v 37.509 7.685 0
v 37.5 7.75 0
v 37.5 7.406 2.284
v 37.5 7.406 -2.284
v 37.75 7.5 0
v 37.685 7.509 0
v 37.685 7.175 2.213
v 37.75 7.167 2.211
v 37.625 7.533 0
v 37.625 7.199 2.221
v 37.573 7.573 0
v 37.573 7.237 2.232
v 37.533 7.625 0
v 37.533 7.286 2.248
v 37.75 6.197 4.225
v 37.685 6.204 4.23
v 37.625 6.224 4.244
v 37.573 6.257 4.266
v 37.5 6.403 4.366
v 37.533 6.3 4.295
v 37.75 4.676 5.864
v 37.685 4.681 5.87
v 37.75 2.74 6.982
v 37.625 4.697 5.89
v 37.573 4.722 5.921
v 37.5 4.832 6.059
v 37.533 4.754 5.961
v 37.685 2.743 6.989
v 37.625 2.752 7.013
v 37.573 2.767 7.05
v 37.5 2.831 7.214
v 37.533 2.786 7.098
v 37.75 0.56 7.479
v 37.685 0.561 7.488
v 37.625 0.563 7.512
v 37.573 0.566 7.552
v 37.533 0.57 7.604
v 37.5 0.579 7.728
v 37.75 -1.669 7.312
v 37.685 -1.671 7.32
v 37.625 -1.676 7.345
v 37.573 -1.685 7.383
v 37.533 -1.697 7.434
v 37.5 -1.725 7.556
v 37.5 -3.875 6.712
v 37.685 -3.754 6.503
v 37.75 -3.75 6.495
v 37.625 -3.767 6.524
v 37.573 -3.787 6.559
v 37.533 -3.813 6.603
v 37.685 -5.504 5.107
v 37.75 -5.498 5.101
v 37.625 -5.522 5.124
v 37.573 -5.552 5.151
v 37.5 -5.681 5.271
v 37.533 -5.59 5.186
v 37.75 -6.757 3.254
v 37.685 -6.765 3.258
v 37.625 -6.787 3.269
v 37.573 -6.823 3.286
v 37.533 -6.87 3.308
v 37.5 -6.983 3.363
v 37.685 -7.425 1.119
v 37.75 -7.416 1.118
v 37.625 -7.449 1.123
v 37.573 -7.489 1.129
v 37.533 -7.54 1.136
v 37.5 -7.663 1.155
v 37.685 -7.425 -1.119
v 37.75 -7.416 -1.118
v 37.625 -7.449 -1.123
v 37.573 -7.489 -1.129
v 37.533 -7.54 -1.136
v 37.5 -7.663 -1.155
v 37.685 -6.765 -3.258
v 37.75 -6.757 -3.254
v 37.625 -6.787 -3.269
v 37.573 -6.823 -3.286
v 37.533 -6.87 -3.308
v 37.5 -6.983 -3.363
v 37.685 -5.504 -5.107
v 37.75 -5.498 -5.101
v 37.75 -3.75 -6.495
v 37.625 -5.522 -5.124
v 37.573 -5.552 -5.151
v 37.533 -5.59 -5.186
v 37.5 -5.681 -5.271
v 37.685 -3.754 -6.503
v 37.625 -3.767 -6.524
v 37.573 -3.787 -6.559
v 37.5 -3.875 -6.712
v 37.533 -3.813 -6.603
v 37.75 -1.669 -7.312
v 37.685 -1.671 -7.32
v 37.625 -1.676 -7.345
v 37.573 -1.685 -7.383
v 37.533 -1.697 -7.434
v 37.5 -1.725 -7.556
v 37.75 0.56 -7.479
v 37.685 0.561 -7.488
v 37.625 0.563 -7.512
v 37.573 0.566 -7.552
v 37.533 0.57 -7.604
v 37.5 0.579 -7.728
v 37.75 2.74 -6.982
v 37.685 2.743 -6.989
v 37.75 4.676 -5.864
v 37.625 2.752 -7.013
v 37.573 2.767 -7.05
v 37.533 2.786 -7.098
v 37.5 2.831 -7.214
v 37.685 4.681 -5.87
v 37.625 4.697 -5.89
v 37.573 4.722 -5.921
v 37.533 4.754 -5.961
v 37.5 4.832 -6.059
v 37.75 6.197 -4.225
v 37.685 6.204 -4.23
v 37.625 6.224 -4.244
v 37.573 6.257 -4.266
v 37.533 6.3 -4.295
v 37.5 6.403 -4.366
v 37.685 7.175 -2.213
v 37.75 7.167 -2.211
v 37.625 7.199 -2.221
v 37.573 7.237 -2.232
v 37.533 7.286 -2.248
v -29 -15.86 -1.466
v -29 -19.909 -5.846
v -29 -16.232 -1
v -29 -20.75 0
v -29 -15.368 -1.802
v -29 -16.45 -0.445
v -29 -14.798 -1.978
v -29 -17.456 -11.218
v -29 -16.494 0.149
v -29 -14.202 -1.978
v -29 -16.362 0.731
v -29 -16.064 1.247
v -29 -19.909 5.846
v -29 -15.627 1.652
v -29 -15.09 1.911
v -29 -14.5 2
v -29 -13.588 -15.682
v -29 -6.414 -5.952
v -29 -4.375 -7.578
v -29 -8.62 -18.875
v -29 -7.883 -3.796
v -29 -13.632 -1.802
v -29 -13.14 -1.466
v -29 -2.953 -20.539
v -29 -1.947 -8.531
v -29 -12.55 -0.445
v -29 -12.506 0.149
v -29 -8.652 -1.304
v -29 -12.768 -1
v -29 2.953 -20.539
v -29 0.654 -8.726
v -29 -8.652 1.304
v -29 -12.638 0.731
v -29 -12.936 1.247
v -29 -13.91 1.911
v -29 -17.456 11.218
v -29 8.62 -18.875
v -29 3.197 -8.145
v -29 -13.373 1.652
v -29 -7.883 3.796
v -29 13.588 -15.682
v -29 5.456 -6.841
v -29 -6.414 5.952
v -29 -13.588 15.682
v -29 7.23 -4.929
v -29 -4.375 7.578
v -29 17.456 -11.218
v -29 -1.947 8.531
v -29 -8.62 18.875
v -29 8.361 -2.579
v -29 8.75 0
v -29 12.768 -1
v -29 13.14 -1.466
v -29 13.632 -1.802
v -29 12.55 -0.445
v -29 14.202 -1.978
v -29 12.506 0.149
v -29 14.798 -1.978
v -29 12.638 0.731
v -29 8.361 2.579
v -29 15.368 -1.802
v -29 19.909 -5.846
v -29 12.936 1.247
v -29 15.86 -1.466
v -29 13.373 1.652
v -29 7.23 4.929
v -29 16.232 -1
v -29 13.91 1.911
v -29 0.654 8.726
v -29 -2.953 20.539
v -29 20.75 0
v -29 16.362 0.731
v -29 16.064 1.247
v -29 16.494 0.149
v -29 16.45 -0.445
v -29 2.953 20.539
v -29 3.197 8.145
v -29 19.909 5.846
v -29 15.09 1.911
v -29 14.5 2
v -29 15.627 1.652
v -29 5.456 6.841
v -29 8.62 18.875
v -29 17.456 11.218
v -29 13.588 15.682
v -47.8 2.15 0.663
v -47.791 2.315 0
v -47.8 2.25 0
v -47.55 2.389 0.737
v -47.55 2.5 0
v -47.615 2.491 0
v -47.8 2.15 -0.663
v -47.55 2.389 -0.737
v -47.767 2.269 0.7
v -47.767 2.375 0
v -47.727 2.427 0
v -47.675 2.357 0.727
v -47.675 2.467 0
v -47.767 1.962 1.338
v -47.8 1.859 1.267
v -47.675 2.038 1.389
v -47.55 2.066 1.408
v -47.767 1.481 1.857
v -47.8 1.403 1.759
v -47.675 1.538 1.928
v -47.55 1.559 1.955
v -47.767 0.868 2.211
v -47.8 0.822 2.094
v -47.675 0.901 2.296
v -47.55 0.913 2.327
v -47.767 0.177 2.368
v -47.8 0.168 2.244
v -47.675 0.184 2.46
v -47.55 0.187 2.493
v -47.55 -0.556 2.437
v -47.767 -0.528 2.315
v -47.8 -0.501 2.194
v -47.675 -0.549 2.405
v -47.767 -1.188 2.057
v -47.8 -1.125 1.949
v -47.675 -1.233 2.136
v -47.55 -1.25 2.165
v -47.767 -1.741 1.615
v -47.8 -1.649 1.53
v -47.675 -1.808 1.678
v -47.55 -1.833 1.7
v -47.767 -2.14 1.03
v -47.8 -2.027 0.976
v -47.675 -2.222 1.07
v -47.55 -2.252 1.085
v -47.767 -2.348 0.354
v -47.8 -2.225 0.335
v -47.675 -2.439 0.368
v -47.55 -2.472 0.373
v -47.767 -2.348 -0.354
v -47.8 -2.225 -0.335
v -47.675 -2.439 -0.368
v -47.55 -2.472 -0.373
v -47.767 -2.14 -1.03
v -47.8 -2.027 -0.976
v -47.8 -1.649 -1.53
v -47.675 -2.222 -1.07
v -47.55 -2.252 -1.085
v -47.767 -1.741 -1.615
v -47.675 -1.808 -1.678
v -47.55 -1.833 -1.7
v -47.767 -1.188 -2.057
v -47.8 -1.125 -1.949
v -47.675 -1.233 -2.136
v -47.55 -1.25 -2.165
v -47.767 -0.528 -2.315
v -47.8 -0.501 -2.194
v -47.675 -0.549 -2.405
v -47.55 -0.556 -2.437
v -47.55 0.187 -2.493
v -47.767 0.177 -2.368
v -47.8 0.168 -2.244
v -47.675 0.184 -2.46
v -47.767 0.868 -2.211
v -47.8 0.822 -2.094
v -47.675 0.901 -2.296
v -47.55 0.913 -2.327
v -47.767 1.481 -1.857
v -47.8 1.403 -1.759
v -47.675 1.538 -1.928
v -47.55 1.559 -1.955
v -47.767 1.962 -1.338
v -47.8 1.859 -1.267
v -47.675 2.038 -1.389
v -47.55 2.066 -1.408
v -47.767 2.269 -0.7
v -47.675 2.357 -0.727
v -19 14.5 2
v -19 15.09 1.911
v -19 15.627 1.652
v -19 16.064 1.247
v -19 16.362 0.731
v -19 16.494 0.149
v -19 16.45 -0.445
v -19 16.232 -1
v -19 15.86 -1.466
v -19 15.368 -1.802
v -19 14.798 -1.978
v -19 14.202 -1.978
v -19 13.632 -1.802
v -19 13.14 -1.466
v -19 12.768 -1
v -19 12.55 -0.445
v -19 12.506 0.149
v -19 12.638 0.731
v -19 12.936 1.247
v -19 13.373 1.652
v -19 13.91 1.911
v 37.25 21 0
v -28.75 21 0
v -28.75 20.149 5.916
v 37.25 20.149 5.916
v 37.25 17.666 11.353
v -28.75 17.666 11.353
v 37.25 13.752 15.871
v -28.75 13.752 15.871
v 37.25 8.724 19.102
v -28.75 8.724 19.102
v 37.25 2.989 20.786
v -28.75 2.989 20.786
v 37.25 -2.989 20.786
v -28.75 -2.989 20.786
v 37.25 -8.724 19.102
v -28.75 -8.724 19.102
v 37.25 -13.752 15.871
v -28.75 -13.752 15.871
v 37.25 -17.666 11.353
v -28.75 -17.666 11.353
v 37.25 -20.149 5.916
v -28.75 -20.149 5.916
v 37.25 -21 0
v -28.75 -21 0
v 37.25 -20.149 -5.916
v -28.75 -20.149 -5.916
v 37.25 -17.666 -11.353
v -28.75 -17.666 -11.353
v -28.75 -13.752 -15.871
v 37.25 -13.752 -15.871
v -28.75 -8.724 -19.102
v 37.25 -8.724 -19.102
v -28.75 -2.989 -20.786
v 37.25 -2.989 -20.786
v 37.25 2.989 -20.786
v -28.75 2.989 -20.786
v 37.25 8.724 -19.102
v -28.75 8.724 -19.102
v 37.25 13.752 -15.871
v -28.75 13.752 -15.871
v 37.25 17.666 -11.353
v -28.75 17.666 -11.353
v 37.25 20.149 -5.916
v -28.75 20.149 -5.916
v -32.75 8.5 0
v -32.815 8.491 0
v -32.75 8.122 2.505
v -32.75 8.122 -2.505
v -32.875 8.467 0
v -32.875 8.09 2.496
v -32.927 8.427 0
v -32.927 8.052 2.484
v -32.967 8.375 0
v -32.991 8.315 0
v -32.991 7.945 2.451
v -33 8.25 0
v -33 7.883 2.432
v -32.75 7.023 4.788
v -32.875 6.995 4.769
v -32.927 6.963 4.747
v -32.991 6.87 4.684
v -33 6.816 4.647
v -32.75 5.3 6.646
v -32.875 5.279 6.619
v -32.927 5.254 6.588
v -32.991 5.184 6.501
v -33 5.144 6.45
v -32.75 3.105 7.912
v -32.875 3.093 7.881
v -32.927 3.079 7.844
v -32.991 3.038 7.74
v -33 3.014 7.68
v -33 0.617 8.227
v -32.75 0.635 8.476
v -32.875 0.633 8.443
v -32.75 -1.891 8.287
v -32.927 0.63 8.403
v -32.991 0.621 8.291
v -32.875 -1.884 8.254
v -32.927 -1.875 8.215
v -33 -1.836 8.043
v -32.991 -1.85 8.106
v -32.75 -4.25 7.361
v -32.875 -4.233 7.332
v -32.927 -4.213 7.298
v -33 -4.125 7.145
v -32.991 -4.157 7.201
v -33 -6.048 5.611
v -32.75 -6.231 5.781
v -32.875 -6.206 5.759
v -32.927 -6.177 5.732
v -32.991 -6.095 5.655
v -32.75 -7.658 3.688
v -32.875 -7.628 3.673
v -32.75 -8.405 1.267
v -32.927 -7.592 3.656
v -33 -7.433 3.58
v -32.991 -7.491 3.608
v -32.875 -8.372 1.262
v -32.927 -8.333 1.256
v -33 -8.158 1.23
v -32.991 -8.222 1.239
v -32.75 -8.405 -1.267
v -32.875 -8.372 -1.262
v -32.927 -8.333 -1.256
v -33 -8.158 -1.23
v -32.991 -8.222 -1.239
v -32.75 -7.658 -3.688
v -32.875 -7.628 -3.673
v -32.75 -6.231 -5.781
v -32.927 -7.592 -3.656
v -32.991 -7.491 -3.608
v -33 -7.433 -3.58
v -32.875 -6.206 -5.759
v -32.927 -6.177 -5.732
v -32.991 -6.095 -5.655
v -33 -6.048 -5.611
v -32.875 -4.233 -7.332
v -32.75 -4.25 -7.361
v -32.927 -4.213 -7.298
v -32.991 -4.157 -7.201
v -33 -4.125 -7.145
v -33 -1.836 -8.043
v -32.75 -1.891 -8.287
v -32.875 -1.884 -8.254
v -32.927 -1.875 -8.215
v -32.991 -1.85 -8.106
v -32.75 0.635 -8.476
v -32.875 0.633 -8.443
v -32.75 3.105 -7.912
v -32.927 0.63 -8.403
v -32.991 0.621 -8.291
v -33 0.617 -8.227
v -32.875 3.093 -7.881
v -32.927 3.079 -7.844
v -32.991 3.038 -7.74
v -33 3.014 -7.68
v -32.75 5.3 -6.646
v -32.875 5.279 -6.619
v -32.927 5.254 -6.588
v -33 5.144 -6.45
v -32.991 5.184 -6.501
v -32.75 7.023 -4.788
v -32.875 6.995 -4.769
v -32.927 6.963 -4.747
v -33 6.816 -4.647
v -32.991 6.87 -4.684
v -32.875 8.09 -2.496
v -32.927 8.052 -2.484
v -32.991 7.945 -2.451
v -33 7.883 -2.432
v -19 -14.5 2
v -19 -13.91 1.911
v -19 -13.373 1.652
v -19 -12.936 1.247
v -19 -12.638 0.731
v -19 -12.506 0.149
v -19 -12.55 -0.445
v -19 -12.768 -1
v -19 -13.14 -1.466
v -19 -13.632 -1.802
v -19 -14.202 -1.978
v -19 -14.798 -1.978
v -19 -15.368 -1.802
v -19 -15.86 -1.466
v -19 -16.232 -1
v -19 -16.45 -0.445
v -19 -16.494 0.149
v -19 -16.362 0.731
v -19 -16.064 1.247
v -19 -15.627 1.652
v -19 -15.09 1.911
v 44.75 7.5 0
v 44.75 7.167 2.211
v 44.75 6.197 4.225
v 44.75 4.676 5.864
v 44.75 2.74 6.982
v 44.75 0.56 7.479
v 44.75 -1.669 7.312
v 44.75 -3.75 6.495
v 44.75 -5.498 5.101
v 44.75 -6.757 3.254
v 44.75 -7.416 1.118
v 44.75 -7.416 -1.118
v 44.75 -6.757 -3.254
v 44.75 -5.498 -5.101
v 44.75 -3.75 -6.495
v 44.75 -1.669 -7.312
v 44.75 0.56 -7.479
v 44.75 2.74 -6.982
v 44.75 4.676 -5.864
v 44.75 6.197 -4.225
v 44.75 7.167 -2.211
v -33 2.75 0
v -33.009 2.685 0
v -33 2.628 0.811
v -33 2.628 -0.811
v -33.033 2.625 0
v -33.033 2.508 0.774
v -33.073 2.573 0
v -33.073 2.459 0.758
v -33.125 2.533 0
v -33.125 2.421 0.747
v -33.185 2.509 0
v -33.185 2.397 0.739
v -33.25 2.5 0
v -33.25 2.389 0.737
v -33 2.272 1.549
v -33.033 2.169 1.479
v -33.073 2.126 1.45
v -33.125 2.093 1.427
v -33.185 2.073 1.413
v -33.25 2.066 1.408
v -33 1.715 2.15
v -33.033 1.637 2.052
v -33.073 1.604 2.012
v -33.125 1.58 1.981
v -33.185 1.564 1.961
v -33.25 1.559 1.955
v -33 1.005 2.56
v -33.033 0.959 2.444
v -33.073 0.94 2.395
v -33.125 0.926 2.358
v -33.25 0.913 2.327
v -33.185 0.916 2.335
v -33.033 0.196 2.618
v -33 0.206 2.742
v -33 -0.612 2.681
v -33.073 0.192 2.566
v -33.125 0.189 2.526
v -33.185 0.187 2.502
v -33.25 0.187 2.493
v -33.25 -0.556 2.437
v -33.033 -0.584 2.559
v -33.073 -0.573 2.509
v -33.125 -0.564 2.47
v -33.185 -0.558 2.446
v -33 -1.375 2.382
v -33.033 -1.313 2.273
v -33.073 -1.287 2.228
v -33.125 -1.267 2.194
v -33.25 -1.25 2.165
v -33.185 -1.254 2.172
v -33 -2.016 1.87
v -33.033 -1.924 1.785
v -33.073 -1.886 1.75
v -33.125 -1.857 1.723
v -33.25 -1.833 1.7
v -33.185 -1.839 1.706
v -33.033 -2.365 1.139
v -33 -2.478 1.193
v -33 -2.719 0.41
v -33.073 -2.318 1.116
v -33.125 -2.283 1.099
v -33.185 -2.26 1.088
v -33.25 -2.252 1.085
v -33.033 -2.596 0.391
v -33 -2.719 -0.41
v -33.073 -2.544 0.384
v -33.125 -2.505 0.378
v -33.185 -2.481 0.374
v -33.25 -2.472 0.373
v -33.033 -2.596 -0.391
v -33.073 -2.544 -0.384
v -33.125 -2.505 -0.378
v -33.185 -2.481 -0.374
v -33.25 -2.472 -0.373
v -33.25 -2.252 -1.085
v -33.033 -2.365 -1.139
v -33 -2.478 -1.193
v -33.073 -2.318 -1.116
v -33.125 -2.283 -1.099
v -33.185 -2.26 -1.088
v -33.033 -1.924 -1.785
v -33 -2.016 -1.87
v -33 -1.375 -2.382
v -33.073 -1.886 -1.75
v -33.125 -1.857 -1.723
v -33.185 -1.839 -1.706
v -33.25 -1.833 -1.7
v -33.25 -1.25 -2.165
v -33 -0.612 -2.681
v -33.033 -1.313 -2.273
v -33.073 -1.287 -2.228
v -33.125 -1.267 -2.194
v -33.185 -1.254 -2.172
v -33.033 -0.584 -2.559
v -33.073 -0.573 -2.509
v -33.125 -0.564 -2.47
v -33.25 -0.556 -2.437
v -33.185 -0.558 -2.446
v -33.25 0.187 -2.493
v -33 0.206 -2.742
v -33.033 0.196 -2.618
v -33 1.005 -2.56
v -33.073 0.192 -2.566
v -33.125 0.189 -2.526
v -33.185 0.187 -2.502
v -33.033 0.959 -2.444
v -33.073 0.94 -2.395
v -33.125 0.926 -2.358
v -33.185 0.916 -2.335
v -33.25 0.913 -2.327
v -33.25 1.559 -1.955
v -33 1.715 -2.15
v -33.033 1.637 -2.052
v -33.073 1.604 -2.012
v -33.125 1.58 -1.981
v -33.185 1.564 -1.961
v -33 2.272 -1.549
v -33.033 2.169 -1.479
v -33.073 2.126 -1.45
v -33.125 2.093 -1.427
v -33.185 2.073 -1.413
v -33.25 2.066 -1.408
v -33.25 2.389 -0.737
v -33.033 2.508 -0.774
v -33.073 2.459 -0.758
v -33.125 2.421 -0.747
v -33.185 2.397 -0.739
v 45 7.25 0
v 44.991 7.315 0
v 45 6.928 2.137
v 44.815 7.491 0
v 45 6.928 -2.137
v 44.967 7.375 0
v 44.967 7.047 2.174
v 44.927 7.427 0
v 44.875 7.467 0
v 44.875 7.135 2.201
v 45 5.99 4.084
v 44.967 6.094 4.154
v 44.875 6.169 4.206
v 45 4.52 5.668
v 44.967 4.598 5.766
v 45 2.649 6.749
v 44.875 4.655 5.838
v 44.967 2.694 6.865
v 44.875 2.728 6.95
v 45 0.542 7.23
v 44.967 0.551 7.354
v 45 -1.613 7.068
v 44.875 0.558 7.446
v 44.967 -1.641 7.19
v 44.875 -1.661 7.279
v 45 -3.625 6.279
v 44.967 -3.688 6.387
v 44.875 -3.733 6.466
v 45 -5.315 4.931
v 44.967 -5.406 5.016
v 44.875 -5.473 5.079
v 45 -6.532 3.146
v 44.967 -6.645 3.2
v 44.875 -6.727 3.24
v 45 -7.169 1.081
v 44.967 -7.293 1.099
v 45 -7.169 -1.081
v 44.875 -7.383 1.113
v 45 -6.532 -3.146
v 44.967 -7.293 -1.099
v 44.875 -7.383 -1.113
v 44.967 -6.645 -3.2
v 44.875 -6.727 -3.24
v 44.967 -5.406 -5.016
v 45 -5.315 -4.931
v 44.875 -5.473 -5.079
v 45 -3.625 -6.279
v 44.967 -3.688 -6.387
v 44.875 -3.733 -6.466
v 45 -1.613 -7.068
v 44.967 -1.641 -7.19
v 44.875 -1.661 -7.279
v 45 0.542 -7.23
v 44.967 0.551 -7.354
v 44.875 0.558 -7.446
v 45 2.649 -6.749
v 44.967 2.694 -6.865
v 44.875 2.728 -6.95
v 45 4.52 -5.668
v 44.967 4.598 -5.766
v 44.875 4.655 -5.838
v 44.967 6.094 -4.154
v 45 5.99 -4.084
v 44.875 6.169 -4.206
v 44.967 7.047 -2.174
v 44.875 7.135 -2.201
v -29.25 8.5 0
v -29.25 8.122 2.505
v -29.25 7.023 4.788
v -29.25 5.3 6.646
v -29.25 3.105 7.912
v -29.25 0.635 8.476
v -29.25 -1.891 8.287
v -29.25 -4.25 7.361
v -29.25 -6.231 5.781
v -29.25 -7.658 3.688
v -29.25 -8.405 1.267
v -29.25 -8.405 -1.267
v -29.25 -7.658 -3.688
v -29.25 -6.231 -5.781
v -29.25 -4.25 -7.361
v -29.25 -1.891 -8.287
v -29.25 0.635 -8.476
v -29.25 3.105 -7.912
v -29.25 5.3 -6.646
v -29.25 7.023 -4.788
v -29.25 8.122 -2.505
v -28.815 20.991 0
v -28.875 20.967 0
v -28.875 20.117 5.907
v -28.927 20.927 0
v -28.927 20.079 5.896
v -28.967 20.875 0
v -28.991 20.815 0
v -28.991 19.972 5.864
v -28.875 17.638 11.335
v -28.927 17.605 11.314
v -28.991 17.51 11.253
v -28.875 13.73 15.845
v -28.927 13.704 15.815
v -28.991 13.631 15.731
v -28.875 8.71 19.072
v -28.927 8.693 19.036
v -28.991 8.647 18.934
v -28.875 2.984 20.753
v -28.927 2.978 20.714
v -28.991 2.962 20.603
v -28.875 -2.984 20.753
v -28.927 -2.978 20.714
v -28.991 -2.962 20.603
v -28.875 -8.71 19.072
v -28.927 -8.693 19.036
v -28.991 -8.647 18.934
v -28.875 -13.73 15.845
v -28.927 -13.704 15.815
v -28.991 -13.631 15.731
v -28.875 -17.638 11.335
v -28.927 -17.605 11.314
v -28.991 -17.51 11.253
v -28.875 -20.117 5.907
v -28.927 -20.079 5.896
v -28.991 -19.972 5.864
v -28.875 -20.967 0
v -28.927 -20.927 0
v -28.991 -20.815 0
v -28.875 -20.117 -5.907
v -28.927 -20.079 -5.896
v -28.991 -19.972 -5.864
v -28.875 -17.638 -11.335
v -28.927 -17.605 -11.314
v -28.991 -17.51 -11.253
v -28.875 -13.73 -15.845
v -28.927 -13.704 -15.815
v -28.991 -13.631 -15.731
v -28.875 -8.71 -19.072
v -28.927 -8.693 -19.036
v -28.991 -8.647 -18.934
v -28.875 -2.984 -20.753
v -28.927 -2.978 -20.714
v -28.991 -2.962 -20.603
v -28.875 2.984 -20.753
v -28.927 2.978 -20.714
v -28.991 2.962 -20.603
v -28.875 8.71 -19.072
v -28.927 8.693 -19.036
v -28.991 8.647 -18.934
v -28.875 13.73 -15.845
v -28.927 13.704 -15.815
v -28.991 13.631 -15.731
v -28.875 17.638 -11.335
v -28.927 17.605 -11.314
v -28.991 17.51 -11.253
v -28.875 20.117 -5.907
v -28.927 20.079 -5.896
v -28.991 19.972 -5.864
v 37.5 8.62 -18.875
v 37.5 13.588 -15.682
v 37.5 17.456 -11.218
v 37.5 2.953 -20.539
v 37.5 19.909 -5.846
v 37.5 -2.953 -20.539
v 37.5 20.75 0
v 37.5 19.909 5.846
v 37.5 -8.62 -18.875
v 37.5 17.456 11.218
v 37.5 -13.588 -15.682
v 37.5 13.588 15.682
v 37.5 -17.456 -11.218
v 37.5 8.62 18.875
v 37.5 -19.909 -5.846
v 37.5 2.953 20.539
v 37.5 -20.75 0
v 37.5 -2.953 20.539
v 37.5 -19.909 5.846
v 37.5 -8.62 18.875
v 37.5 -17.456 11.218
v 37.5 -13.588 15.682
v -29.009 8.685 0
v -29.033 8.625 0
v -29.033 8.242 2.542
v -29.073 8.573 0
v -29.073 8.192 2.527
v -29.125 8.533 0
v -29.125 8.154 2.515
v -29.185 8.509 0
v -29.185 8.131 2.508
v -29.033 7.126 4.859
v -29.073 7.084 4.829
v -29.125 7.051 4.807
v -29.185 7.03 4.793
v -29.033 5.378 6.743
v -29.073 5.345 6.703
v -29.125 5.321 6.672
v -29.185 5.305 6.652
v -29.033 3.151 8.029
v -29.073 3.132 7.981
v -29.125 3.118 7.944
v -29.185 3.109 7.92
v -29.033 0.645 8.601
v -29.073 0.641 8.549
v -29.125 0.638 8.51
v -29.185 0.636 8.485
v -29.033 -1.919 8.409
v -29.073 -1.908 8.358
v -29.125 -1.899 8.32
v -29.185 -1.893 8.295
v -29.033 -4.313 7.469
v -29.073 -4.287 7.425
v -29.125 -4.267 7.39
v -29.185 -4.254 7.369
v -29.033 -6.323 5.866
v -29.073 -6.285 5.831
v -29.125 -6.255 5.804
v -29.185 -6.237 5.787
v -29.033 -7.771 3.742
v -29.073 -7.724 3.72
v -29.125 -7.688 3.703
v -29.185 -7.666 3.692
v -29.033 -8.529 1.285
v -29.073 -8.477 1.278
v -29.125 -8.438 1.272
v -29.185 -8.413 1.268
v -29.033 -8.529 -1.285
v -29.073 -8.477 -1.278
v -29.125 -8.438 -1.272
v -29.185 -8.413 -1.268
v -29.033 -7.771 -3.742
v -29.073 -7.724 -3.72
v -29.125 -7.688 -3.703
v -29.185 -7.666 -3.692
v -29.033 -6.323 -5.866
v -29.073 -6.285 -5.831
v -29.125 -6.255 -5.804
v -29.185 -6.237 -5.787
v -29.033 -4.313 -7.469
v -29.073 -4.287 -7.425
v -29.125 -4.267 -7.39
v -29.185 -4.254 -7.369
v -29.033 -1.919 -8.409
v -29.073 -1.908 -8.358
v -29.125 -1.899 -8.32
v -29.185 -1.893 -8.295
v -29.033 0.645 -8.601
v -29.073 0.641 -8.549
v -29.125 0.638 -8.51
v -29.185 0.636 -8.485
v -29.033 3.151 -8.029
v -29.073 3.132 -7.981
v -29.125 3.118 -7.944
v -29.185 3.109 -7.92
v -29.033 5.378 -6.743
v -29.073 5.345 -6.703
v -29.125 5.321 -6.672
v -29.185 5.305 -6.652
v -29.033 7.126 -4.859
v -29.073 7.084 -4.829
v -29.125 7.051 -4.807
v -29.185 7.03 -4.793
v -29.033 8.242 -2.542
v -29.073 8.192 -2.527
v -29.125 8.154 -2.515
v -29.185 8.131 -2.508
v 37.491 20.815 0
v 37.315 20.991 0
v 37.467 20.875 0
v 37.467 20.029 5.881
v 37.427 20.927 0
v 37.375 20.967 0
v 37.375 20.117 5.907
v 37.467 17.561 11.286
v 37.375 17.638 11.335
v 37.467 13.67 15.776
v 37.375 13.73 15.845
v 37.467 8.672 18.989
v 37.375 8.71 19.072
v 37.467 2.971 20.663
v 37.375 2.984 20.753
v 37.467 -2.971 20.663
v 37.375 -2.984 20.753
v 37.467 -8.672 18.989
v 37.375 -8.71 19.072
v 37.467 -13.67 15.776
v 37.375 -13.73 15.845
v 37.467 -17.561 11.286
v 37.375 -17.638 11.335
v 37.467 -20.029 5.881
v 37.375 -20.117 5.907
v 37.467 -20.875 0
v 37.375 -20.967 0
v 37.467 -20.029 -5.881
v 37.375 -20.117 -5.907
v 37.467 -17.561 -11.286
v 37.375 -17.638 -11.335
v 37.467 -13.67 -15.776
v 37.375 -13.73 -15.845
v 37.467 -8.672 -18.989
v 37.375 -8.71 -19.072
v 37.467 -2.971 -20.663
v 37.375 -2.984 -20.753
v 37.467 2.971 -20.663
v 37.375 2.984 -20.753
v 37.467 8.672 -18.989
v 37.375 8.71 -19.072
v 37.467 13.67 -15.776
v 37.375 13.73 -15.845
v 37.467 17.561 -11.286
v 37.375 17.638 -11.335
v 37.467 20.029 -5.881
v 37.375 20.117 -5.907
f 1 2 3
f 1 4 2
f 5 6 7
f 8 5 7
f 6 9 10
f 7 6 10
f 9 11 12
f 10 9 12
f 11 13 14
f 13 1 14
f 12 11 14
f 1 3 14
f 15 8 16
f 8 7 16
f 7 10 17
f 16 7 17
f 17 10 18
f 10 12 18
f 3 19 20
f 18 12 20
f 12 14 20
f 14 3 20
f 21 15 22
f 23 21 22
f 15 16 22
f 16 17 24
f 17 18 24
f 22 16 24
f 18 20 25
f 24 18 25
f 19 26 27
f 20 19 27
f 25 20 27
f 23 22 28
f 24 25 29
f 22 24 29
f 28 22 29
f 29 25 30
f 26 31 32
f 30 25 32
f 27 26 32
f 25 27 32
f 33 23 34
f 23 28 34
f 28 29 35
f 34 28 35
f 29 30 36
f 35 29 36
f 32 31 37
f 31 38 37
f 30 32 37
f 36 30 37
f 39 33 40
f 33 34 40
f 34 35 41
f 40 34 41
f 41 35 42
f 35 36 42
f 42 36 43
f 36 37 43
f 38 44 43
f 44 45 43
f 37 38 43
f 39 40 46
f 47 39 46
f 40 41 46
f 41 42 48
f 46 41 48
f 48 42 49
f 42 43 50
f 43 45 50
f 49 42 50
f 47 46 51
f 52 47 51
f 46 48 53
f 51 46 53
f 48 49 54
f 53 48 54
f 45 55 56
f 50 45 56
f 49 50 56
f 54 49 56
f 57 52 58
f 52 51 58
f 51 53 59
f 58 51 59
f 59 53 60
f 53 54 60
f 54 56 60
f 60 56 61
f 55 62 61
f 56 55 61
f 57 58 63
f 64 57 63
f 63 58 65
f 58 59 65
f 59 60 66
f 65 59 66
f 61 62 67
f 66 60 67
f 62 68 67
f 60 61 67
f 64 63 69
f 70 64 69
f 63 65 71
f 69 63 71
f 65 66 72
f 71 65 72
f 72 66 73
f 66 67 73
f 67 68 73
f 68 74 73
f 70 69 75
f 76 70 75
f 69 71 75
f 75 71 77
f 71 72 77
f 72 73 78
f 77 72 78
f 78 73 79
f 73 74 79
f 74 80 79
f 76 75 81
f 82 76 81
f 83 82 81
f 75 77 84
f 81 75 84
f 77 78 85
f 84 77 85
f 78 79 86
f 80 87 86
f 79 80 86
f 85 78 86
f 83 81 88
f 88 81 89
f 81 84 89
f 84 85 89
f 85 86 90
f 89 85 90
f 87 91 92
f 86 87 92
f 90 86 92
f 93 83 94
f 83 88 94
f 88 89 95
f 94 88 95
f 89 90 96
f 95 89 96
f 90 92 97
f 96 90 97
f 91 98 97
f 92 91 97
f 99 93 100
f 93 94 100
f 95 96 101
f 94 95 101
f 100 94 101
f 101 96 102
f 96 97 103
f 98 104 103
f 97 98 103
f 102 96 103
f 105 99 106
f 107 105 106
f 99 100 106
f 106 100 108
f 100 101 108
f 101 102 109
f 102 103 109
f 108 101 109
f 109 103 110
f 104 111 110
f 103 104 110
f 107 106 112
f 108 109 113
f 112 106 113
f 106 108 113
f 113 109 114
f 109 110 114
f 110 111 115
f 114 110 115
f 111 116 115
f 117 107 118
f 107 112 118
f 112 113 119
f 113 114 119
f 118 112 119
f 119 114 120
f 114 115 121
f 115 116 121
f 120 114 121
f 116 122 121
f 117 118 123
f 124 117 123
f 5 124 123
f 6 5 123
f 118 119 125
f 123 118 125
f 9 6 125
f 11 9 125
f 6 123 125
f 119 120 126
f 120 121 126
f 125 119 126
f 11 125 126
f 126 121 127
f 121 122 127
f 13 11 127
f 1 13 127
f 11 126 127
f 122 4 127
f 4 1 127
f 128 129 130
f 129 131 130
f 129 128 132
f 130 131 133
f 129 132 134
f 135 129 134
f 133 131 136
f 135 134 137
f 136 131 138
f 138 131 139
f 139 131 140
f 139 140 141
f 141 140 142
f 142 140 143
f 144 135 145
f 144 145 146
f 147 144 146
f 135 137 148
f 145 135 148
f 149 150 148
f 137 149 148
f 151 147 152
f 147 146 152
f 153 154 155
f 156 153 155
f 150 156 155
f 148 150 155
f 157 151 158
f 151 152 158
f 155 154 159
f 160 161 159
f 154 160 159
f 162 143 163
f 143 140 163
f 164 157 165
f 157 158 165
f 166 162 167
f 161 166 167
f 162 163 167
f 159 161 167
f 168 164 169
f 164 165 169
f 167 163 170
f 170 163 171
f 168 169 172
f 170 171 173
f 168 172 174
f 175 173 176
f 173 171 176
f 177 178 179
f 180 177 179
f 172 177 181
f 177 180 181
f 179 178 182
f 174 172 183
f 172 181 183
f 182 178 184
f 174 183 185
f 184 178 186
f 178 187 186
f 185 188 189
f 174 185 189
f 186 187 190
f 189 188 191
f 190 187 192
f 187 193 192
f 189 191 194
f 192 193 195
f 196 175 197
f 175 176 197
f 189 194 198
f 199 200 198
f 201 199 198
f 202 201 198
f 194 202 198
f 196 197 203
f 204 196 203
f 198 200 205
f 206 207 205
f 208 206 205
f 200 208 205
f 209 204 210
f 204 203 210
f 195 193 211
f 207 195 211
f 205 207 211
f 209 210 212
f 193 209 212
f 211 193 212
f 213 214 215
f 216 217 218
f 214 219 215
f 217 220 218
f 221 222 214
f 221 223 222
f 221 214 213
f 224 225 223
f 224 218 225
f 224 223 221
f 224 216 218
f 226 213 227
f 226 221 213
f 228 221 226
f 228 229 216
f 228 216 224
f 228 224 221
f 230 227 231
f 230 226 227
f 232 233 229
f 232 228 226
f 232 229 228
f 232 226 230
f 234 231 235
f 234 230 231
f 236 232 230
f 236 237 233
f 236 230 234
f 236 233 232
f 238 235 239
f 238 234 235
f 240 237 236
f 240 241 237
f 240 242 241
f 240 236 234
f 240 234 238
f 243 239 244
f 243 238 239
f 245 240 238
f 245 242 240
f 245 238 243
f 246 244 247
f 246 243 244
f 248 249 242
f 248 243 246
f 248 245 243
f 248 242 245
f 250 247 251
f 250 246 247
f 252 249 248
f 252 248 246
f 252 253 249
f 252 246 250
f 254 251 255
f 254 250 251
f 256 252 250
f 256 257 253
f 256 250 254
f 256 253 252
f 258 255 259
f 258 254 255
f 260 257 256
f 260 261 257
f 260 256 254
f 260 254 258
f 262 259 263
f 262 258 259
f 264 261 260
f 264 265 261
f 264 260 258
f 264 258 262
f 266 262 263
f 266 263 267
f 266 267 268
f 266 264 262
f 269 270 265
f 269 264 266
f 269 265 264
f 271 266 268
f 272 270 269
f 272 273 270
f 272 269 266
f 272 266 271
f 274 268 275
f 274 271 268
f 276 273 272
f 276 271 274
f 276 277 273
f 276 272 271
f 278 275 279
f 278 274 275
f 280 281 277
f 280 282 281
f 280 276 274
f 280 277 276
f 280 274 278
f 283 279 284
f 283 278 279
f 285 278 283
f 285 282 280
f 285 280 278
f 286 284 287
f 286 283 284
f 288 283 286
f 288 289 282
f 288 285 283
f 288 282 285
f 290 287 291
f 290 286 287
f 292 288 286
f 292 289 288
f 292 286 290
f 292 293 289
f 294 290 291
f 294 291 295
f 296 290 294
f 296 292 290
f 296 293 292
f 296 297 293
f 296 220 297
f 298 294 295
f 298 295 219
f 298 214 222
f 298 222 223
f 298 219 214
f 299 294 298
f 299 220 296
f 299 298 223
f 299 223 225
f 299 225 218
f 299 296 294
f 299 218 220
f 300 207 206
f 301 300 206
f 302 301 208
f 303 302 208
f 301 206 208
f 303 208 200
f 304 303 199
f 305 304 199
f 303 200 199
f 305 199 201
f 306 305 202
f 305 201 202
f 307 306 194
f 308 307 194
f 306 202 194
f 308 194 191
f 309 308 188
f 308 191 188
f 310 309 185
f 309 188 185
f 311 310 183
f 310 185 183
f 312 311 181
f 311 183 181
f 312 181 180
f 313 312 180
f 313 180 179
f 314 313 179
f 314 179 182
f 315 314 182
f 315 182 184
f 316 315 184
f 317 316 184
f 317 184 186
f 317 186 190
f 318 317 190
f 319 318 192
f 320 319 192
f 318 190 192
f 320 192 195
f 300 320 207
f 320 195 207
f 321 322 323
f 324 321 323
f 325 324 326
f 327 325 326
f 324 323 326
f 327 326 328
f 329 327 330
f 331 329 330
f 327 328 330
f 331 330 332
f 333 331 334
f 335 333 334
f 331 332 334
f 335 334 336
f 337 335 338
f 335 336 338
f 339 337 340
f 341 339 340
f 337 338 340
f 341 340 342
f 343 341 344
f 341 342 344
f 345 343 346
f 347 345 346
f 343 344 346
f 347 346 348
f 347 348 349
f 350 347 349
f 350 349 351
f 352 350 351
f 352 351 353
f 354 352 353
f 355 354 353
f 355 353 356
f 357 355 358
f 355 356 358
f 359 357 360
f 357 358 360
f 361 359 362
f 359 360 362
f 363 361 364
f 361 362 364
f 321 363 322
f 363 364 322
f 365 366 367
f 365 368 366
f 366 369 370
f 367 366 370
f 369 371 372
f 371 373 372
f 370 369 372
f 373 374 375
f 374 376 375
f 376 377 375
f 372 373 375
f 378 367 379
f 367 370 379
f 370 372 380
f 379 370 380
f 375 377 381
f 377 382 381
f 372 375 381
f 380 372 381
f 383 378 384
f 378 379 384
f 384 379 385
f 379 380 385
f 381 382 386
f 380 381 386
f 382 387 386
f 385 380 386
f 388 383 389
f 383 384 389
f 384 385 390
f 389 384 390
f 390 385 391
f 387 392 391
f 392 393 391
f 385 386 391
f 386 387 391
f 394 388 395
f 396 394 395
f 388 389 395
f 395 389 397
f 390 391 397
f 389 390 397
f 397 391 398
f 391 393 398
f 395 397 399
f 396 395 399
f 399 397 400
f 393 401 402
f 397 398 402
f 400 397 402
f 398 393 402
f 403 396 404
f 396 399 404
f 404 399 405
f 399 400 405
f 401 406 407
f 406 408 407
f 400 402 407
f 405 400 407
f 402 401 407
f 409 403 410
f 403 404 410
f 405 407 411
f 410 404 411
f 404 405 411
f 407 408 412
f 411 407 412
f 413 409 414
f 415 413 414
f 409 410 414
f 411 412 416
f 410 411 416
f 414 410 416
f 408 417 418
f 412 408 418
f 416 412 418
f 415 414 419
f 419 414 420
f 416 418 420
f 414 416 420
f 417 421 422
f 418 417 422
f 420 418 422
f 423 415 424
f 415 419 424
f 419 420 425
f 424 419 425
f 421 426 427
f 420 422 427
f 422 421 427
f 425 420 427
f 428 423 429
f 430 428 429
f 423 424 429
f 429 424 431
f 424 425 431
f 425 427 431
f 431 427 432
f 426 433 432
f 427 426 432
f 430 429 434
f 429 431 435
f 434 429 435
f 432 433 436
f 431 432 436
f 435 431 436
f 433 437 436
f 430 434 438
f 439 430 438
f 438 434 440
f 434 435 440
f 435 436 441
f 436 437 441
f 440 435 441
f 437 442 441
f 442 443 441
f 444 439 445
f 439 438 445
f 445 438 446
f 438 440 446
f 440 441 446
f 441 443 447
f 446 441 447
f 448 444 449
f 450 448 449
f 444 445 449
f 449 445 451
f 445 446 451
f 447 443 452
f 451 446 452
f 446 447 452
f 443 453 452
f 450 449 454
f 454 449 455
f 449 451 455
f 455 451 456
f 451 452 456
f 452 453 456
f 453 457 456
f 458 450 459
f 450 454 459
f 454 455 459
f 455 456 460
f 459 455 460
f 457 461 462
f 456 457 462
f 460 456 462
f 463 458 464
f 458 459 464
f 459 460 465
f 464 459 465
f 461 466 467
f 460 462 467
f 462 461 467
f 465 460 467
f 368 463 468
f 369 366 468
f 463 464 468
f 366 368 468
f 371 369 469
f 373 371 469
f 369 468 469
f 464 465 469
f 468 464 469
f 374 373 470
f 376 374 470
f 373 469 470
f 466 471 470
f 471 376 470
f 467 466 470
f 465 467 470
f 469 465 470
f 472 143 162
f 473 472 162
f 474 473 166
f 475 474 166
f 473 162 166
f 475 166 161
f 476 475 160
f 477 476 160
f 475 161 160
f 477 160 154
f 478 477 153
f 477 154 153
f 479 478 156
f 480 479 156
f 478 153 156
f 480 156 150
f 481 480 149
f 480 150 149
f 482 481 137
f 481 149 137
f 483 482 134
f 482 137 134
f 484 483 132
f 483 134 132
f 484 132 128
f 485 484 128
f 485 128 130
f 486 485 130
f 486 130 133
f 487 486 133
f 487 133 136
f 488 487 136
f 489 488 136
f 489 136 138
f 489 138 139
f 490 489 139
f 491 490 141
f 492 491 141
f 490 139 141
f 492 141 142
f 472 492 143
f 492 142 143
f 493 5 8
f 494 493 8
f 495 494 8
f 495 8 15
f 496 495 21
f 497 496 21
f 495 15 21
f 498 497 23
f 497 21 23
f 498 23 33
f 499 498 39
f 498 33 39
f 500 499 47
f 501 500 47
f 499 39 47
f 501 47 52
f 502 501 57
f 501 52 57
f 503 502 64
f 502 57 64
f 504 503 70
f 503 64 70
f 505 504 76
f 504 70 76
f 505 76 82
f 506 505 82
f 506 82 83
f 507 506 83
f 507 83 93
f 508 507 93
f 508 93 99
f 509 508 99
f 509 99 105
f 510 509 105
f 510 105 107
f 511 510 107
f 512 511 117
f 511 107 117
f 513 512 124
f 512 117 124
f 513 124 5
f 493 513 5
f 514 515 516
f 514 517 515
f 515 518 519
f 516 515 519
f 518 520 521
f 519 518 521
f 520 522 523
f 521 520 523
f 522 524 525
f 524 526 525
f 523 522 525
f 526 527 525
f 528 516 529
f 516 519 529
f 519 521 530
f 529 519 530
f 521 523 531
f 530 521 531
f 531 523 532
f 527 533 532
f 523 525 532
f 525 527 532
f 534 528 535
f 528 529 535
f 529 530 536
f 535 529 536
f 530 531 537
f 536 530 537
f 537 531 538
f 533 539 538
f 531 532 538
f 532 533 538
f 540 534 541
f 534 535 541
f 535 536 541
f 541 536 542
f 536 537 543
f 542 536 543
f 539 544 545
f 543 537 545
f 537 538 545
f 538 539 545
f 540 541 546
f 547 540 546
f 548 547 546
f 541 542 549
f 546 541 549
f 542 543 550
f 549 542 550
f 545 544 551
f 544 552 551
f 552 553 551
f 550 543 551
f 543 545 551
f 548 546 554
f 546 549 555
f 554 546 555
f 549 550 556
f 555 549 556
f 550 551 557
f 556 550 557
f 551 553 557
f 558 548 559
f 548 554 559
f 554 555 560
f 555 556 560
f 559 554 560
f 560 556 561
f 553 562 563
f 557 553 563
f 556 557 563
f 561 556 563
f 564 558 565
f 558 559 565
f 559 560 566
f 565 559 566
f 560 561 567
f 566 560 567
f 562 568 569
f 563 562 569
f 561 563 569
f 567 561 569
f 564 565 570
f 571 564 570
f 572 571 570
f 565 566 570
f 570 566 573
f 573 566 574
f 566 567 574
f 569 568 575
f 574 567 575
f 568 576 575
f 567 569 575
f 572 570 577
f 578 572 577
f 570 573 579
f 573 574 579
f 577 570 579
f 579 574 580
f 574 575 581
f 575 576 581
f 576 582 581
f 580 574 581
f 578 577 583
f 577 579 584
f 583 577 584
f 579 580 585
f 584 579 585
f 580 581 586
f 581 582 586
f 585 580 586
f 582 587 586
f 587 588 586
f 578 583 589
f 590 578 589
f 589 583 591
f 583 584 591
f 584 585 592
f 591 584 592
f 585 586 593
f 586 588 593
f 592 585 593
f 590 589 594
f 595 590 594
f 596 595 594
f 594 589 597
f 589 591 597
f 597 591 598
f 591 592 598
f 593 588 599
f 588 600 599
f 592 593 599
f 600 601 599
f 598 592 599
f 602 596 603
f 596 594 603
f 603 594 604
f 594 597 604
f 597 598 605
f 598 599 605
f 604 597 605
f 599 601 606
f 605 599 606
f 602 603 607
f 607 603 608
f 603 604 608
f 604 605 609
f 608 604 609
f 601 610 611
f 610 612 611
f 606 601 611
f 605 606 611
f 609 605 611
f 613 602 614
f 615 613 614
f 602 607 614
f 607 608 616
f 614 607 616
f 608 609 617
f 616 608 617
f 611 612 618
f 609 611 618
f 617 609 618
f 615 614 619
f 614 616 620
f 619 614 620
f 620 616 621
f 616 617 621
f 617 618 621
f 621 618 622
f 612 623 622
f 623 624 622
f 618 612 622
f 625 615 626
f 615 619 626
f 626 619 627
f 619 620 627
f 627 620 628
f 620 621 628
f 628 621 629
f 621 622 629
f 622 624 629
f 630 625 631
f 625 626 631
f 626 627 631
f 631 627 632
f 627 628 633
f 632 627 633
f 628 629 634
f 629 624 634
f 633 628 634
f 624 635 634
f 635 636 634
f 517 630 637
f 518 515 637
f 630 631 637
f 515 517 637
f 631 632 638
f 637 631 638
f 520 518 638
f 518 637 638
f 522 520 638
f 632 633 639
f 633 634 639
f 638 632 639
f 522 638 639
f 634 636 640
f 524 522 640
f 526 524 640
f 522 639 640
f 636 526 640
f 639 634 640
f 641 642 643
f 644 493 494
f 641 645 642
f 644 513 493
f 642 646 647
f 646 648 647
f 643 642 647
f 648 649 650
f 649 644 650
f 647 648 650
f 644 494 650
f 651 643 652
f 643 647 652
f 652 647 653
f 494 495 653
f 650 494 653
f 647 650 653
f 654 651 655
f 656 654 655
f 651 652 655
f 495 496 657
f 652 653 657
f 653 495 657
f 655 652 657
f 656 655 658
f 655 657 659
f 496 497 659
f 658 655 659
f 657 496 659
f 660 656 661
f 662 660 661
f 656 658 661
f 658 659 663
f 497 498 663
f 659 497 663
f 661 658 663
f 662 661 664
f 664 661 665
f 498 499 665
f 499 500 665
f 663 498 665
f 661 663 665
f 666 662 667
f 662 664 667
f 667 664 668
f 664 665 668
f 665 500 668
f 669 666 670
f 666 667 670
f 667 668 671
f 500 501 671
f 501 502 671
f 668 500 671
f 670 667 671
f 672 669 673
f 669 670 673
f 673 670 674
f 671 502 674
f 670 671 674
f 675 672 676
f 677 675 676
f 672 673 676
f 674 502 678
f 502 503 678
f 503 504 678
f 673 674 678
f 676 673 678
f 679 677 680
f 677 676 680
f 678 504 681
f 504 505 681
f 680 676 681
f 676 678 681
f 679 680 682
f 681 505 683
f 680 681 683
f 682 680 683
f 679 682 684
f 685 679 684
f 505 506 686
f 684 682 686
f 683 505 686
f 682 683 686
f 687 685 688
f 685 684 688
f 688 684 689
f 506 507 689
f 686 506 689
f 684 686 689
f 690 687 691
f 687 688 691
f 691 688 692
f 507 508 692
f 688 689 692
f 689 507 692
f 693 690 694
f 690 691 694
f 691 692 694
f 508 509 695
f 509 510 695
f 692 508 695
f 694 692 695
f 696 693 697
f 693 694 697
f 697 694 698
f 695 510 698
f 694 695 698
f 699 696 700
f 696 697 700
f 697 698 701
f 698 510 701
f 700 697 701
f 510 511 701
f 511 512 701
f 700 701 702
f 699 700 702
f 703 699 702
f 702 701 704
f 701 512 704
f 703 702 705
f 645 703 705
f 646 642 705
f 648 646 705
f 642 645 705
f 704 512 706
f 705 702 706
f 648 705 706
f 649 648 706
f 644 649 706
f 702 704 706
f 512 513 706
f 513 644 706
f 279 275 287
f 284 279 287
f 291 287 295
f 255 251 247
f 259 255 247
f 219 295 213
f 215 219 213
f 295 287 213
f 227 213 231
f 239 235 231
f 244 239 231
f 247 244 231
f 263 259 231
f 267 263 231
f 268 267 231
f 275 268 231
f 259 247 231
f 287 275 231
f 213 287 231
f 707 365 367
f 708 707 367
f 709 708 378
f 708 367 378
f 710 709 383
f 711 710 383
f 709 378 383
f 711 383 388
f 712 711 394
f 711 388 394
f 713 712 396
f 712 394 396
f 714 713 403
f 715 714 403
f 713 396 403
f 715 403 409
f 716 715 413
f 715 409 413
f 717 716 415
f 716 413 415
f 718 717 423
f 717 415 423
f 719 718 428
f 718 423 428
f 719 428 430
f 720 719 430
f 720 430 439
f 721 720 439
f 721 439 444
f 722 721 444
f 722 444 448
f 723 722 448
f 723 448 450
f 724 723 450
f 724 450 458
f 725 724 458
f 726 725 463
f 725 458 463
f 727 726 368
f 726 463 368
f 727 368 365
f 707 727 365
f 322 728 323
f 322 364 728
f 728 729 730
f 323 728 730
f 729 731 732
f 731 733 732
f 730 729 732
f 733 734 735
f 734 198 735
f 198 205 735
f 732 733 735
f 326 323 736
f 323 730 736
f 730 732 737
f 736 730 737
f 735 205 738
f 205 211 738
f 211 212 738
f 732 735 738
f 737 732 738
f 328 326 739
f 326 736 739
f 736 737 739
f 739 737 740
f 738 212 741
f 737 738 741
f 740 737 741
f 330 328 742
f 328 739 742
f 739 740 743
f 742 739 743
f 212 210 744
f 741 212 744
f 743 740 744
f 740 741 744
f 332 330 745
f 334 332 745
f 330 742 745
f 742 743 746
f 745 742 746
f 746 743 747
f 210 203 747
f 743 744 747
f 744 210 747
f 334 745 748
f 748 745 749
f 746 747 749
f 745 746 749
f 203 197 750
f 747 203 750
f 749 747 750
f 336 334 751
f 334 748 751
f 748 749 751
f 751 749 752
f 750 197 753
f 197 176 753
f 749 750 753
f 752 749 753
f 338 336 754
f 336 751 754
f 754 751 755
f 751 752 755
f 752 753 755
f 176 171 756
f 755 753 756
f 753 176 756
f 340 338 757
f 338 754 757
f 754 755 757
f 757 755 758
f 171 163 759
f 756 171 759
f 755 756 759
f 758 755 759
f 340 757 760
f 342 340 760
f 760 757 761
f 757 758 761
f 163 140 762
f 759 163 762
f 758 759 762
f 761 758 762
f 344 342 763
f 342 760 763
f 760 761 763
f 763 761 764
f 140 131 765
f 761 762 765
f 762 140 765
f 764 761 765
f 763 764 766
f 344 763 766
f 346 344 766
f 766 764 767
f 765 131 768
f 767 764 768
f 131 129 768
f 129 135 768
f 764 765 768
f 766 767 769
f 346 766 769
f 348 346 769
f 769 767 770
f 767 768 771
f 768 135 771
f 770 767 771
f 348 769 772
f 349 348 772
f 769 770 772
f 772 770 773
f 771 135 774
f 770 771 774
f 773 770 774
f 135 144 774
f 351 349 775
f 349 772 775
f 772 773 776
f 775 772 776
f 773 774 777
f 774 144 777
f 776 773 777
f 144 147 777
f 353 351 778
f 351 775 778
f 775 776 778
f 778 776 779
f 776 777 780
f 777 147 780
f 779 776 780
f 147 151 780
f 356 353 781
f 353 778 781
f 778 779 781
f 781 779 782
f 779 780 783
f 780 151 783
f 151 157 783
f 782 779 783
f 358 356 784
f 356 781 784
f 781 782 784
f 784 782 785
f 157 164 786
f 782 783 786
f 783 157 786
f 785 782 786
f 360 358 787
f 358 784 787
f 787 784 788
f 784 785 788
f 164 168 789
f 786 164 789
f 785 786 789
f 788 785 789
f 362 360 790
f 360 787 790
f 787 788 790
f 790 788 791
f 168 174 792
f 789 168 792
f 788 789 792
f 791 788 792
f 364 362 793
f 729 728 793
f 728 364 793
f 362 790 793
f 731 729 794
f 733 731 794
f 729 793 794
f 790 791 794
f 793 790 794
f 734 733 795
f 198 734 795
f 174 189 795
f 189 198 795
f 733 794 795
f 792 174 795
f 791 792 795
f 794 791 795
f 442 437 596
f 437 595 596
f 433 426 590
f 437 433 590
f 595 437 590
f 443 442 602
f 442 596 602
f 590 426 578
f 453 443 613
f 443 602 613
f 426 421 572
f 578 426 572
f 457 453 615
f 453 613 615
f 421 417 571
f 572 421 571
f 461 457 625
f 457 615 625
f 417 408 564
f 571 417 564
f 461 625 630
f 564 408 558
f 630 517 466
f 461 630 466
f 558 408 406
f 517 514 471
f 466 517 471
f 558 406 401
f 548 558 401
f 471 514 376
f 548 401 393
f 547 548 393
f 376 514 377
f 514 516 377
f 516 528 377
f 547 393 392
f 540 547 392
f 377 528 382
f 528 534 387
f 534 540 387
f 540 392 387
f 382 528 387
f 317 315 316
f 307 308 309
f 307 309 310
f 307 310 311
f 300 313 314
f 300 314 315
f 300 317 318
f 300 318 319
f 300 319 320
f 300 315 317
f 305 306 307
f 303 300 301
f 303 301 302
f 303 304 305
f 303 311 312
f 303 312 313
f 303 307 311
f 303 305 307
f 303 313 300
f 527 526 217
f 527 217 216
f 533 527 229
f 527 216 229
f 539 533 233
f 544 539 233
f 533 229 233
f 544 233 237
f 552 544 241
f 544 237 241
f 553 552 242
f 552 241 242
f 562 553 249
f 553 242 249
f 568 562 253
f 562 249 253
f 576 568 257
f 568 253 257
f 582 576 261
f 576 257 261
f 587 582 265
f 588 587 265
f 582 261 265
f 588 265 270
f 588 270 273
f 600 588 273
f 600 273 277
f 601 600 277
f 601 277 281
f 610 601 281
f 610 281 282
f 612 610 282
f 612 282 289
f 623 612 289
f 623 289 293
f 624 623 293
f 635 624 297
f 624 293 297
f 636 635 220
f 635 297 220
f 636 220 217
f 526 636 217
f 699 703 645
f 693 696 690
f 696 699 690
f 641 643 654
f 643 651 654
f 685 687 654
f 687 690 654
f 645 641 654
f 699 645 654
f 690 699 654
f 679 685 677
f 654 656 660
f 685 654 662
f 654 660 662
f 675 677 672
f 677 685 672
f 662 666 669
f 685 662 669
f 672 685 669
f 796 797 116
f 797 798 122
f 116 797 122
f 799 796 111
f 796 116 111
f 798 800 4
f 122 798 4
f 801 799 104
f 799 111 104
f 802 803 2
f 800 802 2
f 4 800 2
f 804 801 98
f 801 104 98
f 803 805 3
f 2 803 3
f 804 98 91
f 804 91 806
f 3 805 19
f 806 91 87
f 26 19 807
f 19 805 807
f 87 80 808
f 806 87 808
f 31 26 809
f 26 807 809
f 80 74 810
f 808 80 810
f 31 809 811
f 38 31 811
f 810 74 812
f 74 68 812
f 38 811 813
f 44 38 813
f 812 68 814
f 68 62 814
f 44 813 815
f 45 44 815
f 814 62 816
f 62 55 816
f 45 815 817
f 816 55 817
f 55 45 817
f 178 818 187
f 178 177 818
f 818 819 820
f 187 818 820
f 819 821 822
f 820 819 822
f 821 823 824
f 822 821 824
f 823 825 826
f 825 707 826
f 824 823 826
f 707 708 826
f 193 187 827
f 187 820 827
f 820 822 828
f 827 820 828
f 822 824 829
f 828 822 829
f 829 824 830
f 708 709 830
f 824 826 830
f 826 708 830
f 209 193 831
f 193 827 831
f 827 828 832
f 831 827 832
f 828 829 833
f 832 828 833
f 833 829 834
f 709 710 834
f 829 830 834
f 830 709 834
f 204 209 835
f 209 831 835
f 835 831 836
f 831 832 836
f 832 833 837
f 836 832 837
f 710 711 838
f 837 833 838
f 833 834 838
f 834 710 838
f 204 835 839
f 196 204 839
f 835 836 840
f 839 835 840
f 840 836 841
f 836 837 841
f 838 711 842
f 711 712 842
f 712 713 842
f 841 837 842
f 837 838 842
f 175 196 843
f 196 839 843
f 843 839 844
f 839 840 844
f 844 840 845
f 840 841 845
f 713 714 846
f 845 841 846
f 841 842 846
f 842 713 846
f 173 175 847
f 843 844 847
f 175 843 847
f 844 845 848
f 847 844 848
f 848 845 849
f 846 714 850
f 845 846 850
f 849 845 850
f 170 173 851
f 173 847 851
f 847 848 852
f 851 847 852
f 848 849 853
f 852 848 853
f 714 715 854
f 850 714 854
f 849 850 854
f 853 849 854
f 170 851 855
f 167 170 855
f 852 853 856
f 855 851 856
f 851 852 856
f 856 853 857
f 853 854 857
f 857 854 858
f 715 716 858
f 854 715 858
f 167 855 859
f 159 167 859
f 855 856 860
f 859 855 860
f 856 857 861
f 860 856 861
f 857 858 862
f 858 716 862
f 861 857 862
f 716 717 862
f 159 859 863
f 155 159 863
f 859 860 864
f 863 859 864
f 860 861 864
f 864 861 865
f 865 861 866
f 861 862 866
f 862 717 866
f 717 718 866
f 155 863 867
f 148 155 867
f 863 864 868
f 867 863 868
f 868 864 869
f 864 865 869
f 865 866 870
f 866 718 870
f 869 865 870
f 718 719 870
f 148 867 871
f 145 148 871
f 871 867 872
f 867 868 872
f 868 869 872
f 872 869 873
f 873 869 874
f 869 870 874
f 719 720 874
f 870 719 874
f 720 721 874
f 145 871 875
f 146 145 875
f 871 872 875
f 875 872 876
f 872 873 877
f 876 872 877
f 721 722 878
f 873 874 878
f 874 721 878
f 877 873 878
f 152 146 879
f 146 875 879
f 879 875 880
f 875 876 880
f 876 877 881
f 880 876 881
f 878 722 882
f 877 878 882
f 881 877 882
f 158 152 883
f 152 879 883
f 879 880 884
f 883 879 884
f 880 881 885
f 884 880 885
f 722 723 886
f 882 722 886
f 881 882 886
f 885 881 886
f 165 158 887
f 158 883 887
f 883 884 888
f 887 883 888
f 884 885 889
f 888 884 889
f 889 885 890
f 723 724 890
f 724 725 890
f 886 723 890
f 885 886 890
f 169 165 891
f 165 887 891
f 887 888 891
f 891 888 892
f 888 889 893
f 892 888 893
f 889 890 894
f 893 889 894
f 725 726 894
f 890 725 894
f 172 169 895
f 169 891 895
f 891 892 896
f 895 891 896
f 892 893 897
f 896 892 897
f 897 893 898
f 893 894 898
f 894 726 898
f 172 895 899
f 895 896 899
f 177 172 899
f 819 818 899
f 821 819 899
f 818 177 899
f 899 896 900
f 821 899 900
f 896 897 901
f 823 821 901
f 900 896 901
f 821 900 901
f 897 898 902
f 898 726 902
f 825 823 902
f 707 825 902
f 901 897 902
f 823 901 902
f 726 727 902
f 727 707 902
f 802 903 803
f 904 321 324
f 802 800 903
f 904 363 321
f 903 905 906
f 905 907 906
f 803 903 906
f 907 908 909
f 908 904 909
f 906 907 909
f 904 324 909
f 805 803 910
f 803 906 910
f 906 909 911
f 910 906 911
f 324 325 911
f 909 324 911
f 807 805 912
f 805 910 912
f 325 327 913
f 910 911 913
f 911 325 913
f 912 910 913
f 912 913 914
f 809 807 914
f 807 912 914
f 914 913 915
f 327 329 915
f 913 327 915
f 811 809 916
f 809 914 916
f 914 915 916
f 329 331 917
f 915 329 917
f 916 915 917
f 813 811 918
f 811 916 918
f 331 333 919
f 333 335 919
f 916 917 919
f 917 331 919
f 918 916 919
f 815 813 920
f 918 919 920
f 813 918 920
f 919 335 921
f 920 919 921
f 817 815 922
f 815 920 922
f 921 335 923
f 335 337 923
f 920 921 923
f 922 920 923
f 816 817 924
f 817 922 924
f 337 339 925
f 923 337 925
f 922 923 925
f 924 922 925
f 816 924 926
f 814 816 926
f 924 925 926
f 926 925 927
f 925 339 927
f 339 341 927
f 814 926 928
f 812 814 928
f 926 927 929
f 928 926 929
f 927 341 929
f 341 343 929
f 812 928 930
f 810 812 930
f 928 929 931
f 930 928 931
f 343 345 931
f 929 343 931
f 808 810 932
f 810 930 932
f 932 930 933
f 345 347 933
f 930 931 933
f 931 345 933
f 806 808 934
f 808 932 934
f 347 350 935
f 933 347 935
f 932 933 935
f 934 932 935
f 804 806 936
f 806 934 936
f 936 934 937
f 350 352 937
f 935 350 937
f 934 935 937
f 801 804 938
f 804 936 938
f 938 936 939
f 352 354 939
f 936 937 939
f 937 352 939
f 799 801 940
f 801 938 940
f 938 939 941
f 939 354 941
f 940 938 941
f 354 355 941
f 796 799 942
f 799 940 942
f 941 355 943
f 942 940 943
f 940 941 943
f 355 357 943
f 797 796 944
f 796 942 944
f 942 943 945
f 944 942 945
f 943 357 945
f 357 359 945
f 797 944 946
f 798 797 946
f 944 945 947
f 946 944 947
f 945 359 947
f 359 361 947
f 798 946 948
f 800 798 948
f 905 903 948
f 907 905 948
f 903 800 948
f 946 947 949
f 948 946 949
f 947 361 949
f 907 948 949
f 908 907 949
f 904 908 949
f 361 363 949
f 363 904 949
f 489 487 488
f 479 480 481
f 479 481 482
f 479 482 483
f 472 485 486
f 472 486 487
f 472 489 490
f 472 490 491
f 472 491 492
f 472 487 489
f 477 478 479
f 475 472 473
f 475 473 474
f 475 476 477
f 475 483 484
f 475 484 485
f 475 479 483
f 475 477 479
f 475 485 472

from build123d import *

# Parameters (mm, degrees)
FILLET1_R          = 0.25
SKETCH4_R          = 2
CUT_EXTRUDE2_DEPTH = 10


with BuildPart() as part:
    # Sketch1 → Revolve1 (revolve)
    with BuildSketch(Plane.XY):
        Polygon((-47.8, 2.5), (-47.8, 0), (45, 0), (45, 7.5), (37.5, 7.5), (37.5, 21), (-29, 21), (-29, 8.5), (-33, 8.5), (-33, 2.5), align=None)
    revolve(axis=Axis((-47.8, 0, 0), (1, 0, 0)))

    # Fillet1
    fillet1_edges = [part.edges().sort_by_distance(p)[0] for p in [
        (37.5, -21, 0),
        (-29, -21, 0),
        (-29, -8.5, 0),
        (-33, -8.5, 0),
        (-33, -2.5, 0),
        (-47.8, -2.5, 0),
        (45, -7.5, 0),
        (37.5, -7.5, 0),
    ]]
    fillet(fillet1_edges, radius=FILLET1_R)

    # Sketch4 → Cut-Extrude2 (cut)
    with BuildSketch(Plane.ZY.offset(29)):
        with Locations((0, 14.5)):
            Circle(SKETCH4_R)
        with Locations((0, -14.5)):
            Circle(SKETCH4_R)
    extrude(amount=-CUT_EXTRUDE2_DEPTH, mode=Mode.SUBTRACT)


solid = part.part
